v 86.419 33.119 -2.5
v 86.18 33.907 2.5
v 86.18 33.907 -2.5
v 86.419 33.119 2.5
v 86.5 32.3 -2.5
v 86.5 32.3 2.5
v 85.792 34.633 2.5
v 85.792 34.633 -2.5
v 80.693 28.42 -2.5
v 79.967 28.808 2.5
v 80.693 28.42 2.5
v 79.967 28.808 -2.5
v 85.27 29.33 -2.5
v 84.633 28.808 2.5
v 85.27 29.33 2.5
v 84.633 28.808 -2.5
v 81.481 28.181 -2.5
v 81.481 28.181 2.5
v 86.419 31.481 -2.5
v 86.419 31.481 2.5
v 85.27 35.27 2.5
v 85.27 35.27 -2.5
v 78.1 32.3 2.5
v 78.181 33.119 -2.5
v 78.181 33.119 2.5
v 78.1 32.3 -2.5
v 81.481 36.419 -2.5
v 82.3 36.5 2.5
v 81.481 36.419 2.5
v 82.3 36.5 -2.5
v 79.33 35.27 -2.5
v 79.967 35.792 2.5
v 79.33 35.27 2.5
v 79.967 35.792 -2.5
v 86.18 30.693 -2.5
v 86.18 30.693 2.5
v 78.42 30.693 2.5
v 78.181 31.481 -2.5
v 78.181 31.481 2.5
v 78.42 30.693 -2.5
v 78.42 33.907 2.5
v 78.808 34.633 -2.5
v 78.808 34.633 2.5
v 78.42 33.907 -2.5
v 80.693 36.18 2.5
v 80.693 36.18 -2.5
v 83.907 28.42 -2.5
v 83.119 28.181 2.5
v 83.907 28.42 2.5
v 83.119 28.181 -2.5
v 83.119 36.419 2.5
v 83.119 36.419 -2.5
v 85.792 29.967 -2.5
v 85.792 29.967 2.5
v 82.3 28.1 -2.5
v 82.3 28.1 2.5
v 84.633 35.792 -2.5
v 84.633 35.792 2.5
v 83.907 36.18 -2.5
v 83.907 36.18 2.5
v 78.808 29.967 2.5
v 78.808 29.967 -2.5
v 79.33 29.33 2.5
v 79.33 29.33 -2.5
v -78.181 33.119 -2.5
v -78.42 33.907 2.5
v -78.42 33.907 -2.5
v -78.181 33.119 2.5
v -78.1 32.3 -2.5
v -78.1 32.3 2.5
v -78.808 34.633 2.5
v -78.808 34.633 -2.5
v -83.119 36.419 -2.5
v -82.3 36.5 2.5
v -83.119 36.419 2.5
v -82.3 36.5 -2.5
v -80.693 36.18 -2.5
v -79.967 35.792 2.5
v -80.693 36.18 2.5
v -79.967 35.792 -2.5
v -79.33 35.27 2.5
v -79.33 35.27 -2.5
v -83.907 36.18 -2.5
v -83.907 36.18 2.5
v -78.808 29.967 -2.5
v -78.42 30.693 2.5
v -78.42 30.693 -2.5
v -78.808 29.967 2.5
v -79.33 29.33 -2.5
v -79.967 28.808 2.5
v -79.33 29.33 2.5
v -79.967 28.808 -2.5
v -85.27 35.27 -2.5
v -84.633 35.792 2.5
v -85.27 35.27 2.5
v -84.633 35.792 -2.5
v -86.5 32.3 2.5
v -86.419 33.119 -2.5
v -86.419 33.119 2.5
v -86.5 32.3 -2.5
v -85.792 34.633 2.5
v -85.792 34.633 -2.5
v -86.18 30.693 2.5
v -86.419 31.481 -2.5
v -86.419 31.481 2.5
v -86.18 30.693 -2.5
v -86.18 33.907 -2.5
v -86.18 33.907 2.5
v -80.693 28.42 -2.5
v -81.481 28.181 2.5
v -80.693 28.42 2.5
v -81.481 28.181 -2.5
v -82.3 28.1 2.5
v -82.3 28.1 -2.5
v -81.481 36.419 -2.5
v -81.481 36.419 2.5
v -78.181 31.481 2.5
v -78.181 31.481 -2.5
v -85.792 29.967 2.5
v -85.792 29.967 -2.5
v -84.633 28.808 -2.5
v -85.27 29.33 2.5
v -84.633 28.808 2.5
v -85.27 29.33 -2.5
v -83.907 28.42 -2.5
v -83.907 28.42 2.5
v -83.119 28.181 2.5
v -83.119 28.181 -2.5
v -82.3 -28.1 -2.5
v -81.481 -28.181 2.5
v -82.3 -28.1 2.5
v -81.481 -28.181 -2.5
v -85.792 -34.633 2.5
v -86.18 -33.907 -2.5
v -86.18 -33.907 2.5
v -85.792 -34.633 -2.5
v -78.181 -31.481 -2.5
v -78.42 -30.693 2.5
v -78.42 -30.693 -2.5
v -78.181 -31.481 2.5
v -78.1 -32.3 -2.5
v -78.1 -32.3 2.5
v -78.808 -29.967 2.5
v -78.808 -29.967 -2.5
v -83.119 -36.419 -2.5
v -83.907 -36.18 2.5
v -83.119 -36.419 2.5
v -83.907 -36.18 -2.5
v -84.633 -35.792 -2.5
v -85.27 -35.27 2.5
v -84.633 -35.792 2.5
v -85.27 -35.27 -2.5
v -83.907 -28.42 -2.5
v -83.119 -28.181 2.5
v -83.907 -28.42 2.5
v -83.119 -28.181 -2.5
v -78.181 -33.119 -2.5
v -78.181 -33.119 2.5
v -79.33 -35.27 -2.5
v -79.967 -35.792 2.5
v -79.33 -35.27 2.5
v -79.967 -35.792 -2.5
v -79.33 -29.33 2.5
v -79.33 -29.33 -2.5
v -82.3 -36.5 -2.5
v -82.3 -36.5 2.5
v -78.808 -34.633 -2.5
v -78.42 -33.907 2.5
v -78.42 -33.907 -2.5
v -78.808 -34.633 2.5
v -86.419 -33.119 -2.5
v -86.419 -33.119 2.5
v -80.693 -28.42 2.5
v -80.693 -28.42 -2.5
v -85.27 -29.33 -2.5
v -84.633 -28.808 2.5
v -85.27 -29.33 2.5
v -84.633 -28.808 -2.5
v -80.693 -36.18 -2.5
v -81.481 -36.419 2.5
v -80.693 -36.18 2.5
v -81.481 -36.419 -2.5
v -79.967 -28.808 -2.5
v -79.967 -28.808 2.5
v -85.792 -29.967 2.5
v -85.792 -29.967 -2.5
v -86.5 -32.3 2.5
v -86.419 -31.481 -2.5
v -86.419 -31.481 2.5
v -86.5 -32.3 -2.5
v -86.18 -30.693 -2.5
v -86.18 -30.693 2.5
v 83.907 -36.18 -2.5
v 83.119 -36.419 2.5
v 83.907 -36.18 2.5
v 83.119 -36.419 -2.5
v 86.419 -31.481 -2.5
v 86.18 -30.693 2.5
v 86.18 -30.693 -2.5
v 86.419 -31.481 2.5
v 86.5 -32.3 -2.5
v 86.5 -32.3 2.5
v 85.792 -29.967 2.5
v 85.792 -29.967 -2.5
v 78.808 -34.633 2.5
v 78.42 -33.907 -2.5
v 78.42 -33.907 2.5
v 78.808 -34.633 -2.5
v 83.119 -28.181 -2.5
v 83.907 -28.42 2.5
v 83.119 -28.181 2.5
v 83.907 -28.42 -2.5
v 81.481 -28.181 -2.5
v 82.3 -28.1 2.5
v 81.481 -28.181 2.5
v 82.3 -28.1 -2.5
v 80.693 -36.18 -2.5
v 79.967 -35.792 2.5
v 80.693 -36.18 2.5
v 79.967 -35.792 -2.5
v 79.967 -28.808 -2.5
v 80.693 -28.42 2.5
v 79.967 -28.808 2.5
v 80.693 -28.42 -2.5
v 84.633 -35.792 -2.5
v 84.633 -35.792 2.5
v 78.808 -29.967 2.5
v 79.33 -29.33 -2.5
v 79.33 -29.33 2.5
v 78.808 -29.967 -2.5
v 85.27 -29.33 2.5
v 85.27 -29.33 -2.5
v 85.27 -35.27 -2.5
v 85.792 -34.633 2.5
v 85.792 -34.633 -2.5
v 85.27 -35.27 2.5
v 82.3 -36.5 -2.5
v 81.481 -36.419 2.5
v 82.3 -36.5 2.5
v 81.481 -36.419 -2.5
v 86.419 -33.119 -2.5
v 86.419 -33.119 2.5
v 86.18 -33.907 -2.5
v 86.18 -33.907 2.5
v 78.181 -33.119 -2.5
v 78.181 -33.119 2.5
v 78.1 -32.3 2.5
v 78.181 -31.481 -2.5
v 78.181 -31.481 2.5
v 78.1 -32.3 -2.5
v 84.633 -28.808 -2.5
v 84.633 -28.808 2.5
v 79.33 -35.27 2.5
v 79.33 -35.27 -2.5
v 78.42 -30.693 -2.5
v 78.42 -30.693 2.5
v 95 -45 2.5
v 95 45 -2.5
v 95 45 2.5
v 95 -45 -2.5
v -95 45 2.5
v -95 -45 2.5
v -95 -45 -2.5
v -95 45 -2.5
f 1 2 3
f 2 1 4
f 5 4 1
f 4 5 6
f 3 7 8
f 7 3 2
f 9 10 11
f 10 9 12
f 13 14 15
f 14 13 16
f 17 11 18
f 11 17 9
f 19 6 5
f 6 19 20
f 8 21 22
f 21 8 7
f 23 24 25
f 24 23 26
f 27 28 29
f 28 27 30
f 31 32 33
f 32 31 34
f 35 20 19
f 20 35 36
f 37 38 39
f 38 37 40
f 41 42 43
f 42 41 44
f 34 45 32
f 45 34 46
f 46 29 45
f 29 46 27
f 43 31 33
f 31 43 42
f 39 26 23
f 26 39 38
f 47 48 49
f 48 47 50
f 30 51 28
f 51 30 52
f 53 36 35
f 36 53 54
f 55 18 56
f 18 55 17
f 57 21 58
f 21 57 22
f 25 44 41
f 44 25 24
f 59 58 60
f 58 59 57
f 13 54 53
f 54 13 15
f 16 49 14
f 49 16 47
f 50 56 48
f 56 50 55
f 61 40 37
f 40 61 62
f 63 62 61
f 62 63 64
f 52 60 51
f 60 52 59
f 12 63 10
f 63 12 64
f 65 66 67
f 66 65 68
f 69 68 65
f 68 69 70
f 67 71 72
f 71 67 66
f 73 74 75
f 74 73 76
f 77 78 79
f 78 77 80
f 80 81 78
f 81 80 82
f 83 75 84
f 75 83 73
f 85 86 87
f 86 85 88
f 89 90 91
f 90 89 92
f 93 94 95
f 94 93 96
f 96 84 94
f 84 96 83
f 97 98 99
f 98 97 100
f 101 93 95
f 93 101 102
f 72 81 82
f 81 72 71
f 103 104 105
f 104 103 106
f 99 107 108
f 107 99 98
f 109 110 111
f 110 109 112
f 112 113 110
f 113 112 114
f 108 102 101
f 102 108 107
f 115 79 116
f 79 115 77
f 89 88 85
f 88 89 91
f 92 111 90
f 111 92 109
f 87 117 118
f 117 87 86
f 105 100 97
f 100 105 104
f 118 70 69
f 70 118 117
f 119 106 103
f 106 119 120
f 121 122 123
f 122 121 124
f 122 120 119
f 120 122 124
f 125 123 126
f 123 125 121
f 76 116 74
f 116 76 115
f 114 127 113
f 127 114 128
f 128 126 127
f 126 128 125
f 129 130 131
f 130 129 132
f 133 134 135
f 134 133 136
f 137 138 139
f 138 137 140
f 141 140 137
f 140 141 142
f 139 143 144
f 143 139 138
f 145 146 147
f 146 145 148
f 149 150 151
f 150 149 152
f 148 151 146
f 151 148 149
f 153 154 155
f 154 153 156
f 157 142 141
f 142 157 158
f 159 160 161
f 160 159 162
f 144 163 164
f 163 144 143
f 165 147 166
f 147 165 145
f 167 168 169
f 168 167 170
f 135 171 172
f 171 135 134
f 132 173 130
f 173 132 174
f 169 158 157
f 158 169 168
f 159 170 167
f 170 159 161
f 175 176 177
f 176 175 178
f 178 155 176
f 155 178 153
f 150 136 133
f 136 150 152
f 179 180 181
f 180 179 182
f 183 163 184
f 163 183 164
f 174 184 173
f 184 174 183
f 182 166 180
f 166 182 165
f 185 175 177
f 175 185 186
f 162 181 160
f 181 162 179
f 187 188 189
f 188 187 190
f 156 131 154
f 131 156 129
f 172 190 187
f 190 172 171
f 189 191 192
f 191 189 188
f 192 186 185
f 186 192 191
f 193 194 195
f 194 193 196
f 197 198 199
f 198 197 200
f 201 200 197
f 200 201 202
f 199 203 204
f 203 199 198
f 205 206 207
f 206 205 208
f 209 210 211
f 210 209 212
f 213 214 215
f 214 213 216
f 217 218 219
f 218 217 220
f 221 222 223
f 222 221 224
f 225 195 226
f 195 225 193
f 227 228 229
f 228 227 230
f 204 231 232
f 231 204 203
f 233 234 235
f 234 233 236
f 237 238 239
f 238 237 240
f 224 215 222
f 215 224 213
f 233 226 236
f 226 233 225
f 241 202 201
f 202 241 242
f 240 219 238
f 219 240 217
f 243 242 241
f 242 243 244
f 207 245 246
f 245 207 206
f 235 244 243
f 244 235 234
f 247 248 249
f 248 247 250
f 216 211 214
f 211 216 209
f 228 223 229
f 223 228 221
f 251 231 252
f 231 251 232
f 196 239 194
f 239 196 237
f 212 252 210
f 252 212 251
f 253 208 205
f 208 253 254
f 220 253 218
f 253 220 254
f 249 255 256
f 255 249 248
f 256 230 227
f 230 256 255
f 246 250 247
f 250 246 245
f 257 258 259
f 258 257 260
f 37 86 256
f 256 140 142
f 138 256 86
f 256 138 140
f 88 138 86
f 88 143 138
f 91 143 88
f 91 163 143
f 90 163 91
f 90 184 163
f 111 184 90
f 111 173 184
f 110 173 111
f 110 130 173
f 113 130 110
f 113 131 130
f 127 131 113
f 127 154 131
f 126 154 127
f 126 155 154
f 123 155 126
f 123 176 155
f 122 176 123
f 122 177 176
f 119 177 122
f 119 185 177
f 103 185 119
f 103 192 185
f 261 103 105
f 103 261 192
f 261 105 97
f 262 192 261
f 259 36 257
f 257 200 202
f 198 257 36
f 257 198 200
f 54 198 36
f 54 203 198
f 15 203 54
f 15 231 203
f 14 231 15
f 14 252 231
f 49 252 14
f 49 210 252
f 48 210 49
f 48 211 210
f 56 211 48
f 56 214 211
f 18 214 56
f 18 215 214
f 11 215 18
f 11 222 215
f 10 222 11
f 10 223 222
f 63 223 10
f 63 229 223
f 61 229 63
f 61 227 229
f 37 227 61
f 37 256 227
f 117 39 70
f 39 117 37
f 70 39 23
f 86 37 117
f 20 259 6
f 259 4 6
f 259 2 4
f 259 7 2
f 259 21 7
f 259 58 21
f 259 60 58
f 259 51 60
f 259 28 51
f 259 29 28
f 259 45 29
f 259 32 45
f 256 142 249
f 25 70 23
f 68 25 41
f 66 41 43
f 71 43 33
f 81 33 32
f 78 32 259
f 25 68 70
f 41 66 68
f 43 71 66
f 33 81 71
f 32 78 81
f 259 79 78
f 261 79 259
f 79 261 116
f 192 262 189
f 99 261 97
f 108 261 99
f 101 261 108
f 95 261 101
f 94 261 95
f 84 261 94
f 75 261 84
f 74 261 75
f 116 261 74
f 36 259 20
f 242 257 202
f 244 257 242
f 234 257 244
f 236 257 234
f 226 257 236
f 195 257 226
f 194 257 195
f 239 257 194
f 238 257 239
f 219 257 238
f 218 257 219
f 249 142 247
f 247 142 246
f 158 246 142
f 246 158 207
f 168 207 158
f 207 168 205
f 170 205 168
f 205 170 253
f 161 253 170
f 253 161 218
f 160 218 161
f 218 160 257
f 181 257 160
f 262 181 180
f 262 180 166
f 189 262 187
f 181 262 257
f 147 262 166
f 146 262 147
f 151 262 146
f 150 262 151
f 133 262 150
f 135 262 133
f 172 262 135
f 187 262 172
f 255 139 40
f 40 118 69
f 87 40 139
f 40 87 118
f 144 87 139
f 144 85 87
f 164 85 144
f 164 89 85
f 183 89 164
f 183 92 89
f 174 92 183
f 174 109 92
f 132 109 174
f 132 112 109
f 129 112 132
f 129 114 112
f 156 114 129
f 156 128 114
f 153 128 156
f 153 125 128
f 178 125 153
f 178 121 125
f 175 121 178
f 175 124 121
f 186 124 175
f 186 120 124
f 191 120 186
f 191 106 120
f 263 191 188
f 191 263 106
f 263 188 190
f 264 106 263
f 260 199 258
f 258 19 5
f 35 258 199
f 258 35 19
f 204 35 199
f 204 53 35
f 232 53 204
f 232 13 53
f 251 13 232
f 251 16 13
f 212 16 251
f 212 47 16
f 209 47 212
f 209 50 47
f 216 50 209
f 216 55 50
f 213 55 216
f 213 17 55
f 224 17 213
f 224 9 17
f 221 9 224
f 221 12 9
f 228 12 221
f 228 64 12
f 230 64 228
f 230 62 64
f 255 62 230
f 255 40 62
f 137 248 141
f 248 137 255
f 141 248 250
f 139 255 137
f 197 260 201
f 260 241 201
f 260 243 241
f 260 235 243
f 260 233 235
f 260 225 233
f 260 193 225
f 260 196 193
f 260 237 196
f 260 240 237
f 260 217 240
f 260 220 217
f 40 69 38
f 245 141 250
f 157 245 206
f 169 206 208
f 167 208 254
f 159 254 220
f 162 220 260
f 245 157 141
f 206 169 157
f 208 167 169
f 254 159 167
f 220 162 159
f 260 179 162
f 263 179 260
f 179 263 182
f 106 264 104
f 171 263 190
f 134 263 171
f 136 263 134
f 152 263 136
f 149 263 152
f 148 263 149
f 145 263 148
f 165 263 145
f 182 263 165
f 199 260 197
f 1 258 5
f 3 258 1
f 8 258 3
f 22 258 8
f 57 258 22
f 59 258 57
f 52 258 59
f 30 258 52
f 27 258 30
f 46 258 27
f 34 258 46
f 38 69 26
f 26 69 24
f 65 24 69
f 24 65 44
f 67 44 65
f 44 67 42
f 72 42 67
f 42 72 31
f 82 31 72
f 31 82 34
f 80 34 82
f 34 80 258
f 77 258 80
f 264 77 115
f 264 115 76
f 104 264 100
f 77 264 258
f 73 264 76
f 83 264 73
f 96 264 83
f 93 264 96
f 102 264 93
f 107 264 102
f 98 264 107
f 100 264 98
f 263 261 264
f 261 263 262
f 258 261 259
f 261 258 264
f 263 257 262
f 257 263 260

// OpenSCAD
$fn = 32;

// ----------------------------------------------------------------------
// Corner plate 190 x 90 x 5
// 4 holes, centres taken from the edge offset
// ----------------------------------------------------------------------

// --- parameters (mm) ---
plate = [190, 90, 5];  // overall size (x, y, z)
holes = 4;             // number of holes the drawing asks for
hole_d = 8.4;          // hole diameter
edge = 12.7;           // hole centre offset from the plate edge

// --- derived feature positions (mm) ---
corner_x = plate[0] / 2 - edge;  // = 82.3   corner hole X
corner_y = plate[1] / 2 - edge;  // = 32.3   corner hole Y
feature_centers = [
  [corner_x, corner_y],
  [-corner_x, corner_y],
  [-corner_x, -corner_y],
  [corner_x, -corner_y]
];   // hole centres the loop below drills

// plate outline, every hole drilled through with the same cutters
difference() {
  cube(plate, center = true);
  for (centre = feature_centers)
    translate([centre[0], centre[1], 0])
      cylinder(d = hole_d, h = plate[2] + 2, center = true);
}
